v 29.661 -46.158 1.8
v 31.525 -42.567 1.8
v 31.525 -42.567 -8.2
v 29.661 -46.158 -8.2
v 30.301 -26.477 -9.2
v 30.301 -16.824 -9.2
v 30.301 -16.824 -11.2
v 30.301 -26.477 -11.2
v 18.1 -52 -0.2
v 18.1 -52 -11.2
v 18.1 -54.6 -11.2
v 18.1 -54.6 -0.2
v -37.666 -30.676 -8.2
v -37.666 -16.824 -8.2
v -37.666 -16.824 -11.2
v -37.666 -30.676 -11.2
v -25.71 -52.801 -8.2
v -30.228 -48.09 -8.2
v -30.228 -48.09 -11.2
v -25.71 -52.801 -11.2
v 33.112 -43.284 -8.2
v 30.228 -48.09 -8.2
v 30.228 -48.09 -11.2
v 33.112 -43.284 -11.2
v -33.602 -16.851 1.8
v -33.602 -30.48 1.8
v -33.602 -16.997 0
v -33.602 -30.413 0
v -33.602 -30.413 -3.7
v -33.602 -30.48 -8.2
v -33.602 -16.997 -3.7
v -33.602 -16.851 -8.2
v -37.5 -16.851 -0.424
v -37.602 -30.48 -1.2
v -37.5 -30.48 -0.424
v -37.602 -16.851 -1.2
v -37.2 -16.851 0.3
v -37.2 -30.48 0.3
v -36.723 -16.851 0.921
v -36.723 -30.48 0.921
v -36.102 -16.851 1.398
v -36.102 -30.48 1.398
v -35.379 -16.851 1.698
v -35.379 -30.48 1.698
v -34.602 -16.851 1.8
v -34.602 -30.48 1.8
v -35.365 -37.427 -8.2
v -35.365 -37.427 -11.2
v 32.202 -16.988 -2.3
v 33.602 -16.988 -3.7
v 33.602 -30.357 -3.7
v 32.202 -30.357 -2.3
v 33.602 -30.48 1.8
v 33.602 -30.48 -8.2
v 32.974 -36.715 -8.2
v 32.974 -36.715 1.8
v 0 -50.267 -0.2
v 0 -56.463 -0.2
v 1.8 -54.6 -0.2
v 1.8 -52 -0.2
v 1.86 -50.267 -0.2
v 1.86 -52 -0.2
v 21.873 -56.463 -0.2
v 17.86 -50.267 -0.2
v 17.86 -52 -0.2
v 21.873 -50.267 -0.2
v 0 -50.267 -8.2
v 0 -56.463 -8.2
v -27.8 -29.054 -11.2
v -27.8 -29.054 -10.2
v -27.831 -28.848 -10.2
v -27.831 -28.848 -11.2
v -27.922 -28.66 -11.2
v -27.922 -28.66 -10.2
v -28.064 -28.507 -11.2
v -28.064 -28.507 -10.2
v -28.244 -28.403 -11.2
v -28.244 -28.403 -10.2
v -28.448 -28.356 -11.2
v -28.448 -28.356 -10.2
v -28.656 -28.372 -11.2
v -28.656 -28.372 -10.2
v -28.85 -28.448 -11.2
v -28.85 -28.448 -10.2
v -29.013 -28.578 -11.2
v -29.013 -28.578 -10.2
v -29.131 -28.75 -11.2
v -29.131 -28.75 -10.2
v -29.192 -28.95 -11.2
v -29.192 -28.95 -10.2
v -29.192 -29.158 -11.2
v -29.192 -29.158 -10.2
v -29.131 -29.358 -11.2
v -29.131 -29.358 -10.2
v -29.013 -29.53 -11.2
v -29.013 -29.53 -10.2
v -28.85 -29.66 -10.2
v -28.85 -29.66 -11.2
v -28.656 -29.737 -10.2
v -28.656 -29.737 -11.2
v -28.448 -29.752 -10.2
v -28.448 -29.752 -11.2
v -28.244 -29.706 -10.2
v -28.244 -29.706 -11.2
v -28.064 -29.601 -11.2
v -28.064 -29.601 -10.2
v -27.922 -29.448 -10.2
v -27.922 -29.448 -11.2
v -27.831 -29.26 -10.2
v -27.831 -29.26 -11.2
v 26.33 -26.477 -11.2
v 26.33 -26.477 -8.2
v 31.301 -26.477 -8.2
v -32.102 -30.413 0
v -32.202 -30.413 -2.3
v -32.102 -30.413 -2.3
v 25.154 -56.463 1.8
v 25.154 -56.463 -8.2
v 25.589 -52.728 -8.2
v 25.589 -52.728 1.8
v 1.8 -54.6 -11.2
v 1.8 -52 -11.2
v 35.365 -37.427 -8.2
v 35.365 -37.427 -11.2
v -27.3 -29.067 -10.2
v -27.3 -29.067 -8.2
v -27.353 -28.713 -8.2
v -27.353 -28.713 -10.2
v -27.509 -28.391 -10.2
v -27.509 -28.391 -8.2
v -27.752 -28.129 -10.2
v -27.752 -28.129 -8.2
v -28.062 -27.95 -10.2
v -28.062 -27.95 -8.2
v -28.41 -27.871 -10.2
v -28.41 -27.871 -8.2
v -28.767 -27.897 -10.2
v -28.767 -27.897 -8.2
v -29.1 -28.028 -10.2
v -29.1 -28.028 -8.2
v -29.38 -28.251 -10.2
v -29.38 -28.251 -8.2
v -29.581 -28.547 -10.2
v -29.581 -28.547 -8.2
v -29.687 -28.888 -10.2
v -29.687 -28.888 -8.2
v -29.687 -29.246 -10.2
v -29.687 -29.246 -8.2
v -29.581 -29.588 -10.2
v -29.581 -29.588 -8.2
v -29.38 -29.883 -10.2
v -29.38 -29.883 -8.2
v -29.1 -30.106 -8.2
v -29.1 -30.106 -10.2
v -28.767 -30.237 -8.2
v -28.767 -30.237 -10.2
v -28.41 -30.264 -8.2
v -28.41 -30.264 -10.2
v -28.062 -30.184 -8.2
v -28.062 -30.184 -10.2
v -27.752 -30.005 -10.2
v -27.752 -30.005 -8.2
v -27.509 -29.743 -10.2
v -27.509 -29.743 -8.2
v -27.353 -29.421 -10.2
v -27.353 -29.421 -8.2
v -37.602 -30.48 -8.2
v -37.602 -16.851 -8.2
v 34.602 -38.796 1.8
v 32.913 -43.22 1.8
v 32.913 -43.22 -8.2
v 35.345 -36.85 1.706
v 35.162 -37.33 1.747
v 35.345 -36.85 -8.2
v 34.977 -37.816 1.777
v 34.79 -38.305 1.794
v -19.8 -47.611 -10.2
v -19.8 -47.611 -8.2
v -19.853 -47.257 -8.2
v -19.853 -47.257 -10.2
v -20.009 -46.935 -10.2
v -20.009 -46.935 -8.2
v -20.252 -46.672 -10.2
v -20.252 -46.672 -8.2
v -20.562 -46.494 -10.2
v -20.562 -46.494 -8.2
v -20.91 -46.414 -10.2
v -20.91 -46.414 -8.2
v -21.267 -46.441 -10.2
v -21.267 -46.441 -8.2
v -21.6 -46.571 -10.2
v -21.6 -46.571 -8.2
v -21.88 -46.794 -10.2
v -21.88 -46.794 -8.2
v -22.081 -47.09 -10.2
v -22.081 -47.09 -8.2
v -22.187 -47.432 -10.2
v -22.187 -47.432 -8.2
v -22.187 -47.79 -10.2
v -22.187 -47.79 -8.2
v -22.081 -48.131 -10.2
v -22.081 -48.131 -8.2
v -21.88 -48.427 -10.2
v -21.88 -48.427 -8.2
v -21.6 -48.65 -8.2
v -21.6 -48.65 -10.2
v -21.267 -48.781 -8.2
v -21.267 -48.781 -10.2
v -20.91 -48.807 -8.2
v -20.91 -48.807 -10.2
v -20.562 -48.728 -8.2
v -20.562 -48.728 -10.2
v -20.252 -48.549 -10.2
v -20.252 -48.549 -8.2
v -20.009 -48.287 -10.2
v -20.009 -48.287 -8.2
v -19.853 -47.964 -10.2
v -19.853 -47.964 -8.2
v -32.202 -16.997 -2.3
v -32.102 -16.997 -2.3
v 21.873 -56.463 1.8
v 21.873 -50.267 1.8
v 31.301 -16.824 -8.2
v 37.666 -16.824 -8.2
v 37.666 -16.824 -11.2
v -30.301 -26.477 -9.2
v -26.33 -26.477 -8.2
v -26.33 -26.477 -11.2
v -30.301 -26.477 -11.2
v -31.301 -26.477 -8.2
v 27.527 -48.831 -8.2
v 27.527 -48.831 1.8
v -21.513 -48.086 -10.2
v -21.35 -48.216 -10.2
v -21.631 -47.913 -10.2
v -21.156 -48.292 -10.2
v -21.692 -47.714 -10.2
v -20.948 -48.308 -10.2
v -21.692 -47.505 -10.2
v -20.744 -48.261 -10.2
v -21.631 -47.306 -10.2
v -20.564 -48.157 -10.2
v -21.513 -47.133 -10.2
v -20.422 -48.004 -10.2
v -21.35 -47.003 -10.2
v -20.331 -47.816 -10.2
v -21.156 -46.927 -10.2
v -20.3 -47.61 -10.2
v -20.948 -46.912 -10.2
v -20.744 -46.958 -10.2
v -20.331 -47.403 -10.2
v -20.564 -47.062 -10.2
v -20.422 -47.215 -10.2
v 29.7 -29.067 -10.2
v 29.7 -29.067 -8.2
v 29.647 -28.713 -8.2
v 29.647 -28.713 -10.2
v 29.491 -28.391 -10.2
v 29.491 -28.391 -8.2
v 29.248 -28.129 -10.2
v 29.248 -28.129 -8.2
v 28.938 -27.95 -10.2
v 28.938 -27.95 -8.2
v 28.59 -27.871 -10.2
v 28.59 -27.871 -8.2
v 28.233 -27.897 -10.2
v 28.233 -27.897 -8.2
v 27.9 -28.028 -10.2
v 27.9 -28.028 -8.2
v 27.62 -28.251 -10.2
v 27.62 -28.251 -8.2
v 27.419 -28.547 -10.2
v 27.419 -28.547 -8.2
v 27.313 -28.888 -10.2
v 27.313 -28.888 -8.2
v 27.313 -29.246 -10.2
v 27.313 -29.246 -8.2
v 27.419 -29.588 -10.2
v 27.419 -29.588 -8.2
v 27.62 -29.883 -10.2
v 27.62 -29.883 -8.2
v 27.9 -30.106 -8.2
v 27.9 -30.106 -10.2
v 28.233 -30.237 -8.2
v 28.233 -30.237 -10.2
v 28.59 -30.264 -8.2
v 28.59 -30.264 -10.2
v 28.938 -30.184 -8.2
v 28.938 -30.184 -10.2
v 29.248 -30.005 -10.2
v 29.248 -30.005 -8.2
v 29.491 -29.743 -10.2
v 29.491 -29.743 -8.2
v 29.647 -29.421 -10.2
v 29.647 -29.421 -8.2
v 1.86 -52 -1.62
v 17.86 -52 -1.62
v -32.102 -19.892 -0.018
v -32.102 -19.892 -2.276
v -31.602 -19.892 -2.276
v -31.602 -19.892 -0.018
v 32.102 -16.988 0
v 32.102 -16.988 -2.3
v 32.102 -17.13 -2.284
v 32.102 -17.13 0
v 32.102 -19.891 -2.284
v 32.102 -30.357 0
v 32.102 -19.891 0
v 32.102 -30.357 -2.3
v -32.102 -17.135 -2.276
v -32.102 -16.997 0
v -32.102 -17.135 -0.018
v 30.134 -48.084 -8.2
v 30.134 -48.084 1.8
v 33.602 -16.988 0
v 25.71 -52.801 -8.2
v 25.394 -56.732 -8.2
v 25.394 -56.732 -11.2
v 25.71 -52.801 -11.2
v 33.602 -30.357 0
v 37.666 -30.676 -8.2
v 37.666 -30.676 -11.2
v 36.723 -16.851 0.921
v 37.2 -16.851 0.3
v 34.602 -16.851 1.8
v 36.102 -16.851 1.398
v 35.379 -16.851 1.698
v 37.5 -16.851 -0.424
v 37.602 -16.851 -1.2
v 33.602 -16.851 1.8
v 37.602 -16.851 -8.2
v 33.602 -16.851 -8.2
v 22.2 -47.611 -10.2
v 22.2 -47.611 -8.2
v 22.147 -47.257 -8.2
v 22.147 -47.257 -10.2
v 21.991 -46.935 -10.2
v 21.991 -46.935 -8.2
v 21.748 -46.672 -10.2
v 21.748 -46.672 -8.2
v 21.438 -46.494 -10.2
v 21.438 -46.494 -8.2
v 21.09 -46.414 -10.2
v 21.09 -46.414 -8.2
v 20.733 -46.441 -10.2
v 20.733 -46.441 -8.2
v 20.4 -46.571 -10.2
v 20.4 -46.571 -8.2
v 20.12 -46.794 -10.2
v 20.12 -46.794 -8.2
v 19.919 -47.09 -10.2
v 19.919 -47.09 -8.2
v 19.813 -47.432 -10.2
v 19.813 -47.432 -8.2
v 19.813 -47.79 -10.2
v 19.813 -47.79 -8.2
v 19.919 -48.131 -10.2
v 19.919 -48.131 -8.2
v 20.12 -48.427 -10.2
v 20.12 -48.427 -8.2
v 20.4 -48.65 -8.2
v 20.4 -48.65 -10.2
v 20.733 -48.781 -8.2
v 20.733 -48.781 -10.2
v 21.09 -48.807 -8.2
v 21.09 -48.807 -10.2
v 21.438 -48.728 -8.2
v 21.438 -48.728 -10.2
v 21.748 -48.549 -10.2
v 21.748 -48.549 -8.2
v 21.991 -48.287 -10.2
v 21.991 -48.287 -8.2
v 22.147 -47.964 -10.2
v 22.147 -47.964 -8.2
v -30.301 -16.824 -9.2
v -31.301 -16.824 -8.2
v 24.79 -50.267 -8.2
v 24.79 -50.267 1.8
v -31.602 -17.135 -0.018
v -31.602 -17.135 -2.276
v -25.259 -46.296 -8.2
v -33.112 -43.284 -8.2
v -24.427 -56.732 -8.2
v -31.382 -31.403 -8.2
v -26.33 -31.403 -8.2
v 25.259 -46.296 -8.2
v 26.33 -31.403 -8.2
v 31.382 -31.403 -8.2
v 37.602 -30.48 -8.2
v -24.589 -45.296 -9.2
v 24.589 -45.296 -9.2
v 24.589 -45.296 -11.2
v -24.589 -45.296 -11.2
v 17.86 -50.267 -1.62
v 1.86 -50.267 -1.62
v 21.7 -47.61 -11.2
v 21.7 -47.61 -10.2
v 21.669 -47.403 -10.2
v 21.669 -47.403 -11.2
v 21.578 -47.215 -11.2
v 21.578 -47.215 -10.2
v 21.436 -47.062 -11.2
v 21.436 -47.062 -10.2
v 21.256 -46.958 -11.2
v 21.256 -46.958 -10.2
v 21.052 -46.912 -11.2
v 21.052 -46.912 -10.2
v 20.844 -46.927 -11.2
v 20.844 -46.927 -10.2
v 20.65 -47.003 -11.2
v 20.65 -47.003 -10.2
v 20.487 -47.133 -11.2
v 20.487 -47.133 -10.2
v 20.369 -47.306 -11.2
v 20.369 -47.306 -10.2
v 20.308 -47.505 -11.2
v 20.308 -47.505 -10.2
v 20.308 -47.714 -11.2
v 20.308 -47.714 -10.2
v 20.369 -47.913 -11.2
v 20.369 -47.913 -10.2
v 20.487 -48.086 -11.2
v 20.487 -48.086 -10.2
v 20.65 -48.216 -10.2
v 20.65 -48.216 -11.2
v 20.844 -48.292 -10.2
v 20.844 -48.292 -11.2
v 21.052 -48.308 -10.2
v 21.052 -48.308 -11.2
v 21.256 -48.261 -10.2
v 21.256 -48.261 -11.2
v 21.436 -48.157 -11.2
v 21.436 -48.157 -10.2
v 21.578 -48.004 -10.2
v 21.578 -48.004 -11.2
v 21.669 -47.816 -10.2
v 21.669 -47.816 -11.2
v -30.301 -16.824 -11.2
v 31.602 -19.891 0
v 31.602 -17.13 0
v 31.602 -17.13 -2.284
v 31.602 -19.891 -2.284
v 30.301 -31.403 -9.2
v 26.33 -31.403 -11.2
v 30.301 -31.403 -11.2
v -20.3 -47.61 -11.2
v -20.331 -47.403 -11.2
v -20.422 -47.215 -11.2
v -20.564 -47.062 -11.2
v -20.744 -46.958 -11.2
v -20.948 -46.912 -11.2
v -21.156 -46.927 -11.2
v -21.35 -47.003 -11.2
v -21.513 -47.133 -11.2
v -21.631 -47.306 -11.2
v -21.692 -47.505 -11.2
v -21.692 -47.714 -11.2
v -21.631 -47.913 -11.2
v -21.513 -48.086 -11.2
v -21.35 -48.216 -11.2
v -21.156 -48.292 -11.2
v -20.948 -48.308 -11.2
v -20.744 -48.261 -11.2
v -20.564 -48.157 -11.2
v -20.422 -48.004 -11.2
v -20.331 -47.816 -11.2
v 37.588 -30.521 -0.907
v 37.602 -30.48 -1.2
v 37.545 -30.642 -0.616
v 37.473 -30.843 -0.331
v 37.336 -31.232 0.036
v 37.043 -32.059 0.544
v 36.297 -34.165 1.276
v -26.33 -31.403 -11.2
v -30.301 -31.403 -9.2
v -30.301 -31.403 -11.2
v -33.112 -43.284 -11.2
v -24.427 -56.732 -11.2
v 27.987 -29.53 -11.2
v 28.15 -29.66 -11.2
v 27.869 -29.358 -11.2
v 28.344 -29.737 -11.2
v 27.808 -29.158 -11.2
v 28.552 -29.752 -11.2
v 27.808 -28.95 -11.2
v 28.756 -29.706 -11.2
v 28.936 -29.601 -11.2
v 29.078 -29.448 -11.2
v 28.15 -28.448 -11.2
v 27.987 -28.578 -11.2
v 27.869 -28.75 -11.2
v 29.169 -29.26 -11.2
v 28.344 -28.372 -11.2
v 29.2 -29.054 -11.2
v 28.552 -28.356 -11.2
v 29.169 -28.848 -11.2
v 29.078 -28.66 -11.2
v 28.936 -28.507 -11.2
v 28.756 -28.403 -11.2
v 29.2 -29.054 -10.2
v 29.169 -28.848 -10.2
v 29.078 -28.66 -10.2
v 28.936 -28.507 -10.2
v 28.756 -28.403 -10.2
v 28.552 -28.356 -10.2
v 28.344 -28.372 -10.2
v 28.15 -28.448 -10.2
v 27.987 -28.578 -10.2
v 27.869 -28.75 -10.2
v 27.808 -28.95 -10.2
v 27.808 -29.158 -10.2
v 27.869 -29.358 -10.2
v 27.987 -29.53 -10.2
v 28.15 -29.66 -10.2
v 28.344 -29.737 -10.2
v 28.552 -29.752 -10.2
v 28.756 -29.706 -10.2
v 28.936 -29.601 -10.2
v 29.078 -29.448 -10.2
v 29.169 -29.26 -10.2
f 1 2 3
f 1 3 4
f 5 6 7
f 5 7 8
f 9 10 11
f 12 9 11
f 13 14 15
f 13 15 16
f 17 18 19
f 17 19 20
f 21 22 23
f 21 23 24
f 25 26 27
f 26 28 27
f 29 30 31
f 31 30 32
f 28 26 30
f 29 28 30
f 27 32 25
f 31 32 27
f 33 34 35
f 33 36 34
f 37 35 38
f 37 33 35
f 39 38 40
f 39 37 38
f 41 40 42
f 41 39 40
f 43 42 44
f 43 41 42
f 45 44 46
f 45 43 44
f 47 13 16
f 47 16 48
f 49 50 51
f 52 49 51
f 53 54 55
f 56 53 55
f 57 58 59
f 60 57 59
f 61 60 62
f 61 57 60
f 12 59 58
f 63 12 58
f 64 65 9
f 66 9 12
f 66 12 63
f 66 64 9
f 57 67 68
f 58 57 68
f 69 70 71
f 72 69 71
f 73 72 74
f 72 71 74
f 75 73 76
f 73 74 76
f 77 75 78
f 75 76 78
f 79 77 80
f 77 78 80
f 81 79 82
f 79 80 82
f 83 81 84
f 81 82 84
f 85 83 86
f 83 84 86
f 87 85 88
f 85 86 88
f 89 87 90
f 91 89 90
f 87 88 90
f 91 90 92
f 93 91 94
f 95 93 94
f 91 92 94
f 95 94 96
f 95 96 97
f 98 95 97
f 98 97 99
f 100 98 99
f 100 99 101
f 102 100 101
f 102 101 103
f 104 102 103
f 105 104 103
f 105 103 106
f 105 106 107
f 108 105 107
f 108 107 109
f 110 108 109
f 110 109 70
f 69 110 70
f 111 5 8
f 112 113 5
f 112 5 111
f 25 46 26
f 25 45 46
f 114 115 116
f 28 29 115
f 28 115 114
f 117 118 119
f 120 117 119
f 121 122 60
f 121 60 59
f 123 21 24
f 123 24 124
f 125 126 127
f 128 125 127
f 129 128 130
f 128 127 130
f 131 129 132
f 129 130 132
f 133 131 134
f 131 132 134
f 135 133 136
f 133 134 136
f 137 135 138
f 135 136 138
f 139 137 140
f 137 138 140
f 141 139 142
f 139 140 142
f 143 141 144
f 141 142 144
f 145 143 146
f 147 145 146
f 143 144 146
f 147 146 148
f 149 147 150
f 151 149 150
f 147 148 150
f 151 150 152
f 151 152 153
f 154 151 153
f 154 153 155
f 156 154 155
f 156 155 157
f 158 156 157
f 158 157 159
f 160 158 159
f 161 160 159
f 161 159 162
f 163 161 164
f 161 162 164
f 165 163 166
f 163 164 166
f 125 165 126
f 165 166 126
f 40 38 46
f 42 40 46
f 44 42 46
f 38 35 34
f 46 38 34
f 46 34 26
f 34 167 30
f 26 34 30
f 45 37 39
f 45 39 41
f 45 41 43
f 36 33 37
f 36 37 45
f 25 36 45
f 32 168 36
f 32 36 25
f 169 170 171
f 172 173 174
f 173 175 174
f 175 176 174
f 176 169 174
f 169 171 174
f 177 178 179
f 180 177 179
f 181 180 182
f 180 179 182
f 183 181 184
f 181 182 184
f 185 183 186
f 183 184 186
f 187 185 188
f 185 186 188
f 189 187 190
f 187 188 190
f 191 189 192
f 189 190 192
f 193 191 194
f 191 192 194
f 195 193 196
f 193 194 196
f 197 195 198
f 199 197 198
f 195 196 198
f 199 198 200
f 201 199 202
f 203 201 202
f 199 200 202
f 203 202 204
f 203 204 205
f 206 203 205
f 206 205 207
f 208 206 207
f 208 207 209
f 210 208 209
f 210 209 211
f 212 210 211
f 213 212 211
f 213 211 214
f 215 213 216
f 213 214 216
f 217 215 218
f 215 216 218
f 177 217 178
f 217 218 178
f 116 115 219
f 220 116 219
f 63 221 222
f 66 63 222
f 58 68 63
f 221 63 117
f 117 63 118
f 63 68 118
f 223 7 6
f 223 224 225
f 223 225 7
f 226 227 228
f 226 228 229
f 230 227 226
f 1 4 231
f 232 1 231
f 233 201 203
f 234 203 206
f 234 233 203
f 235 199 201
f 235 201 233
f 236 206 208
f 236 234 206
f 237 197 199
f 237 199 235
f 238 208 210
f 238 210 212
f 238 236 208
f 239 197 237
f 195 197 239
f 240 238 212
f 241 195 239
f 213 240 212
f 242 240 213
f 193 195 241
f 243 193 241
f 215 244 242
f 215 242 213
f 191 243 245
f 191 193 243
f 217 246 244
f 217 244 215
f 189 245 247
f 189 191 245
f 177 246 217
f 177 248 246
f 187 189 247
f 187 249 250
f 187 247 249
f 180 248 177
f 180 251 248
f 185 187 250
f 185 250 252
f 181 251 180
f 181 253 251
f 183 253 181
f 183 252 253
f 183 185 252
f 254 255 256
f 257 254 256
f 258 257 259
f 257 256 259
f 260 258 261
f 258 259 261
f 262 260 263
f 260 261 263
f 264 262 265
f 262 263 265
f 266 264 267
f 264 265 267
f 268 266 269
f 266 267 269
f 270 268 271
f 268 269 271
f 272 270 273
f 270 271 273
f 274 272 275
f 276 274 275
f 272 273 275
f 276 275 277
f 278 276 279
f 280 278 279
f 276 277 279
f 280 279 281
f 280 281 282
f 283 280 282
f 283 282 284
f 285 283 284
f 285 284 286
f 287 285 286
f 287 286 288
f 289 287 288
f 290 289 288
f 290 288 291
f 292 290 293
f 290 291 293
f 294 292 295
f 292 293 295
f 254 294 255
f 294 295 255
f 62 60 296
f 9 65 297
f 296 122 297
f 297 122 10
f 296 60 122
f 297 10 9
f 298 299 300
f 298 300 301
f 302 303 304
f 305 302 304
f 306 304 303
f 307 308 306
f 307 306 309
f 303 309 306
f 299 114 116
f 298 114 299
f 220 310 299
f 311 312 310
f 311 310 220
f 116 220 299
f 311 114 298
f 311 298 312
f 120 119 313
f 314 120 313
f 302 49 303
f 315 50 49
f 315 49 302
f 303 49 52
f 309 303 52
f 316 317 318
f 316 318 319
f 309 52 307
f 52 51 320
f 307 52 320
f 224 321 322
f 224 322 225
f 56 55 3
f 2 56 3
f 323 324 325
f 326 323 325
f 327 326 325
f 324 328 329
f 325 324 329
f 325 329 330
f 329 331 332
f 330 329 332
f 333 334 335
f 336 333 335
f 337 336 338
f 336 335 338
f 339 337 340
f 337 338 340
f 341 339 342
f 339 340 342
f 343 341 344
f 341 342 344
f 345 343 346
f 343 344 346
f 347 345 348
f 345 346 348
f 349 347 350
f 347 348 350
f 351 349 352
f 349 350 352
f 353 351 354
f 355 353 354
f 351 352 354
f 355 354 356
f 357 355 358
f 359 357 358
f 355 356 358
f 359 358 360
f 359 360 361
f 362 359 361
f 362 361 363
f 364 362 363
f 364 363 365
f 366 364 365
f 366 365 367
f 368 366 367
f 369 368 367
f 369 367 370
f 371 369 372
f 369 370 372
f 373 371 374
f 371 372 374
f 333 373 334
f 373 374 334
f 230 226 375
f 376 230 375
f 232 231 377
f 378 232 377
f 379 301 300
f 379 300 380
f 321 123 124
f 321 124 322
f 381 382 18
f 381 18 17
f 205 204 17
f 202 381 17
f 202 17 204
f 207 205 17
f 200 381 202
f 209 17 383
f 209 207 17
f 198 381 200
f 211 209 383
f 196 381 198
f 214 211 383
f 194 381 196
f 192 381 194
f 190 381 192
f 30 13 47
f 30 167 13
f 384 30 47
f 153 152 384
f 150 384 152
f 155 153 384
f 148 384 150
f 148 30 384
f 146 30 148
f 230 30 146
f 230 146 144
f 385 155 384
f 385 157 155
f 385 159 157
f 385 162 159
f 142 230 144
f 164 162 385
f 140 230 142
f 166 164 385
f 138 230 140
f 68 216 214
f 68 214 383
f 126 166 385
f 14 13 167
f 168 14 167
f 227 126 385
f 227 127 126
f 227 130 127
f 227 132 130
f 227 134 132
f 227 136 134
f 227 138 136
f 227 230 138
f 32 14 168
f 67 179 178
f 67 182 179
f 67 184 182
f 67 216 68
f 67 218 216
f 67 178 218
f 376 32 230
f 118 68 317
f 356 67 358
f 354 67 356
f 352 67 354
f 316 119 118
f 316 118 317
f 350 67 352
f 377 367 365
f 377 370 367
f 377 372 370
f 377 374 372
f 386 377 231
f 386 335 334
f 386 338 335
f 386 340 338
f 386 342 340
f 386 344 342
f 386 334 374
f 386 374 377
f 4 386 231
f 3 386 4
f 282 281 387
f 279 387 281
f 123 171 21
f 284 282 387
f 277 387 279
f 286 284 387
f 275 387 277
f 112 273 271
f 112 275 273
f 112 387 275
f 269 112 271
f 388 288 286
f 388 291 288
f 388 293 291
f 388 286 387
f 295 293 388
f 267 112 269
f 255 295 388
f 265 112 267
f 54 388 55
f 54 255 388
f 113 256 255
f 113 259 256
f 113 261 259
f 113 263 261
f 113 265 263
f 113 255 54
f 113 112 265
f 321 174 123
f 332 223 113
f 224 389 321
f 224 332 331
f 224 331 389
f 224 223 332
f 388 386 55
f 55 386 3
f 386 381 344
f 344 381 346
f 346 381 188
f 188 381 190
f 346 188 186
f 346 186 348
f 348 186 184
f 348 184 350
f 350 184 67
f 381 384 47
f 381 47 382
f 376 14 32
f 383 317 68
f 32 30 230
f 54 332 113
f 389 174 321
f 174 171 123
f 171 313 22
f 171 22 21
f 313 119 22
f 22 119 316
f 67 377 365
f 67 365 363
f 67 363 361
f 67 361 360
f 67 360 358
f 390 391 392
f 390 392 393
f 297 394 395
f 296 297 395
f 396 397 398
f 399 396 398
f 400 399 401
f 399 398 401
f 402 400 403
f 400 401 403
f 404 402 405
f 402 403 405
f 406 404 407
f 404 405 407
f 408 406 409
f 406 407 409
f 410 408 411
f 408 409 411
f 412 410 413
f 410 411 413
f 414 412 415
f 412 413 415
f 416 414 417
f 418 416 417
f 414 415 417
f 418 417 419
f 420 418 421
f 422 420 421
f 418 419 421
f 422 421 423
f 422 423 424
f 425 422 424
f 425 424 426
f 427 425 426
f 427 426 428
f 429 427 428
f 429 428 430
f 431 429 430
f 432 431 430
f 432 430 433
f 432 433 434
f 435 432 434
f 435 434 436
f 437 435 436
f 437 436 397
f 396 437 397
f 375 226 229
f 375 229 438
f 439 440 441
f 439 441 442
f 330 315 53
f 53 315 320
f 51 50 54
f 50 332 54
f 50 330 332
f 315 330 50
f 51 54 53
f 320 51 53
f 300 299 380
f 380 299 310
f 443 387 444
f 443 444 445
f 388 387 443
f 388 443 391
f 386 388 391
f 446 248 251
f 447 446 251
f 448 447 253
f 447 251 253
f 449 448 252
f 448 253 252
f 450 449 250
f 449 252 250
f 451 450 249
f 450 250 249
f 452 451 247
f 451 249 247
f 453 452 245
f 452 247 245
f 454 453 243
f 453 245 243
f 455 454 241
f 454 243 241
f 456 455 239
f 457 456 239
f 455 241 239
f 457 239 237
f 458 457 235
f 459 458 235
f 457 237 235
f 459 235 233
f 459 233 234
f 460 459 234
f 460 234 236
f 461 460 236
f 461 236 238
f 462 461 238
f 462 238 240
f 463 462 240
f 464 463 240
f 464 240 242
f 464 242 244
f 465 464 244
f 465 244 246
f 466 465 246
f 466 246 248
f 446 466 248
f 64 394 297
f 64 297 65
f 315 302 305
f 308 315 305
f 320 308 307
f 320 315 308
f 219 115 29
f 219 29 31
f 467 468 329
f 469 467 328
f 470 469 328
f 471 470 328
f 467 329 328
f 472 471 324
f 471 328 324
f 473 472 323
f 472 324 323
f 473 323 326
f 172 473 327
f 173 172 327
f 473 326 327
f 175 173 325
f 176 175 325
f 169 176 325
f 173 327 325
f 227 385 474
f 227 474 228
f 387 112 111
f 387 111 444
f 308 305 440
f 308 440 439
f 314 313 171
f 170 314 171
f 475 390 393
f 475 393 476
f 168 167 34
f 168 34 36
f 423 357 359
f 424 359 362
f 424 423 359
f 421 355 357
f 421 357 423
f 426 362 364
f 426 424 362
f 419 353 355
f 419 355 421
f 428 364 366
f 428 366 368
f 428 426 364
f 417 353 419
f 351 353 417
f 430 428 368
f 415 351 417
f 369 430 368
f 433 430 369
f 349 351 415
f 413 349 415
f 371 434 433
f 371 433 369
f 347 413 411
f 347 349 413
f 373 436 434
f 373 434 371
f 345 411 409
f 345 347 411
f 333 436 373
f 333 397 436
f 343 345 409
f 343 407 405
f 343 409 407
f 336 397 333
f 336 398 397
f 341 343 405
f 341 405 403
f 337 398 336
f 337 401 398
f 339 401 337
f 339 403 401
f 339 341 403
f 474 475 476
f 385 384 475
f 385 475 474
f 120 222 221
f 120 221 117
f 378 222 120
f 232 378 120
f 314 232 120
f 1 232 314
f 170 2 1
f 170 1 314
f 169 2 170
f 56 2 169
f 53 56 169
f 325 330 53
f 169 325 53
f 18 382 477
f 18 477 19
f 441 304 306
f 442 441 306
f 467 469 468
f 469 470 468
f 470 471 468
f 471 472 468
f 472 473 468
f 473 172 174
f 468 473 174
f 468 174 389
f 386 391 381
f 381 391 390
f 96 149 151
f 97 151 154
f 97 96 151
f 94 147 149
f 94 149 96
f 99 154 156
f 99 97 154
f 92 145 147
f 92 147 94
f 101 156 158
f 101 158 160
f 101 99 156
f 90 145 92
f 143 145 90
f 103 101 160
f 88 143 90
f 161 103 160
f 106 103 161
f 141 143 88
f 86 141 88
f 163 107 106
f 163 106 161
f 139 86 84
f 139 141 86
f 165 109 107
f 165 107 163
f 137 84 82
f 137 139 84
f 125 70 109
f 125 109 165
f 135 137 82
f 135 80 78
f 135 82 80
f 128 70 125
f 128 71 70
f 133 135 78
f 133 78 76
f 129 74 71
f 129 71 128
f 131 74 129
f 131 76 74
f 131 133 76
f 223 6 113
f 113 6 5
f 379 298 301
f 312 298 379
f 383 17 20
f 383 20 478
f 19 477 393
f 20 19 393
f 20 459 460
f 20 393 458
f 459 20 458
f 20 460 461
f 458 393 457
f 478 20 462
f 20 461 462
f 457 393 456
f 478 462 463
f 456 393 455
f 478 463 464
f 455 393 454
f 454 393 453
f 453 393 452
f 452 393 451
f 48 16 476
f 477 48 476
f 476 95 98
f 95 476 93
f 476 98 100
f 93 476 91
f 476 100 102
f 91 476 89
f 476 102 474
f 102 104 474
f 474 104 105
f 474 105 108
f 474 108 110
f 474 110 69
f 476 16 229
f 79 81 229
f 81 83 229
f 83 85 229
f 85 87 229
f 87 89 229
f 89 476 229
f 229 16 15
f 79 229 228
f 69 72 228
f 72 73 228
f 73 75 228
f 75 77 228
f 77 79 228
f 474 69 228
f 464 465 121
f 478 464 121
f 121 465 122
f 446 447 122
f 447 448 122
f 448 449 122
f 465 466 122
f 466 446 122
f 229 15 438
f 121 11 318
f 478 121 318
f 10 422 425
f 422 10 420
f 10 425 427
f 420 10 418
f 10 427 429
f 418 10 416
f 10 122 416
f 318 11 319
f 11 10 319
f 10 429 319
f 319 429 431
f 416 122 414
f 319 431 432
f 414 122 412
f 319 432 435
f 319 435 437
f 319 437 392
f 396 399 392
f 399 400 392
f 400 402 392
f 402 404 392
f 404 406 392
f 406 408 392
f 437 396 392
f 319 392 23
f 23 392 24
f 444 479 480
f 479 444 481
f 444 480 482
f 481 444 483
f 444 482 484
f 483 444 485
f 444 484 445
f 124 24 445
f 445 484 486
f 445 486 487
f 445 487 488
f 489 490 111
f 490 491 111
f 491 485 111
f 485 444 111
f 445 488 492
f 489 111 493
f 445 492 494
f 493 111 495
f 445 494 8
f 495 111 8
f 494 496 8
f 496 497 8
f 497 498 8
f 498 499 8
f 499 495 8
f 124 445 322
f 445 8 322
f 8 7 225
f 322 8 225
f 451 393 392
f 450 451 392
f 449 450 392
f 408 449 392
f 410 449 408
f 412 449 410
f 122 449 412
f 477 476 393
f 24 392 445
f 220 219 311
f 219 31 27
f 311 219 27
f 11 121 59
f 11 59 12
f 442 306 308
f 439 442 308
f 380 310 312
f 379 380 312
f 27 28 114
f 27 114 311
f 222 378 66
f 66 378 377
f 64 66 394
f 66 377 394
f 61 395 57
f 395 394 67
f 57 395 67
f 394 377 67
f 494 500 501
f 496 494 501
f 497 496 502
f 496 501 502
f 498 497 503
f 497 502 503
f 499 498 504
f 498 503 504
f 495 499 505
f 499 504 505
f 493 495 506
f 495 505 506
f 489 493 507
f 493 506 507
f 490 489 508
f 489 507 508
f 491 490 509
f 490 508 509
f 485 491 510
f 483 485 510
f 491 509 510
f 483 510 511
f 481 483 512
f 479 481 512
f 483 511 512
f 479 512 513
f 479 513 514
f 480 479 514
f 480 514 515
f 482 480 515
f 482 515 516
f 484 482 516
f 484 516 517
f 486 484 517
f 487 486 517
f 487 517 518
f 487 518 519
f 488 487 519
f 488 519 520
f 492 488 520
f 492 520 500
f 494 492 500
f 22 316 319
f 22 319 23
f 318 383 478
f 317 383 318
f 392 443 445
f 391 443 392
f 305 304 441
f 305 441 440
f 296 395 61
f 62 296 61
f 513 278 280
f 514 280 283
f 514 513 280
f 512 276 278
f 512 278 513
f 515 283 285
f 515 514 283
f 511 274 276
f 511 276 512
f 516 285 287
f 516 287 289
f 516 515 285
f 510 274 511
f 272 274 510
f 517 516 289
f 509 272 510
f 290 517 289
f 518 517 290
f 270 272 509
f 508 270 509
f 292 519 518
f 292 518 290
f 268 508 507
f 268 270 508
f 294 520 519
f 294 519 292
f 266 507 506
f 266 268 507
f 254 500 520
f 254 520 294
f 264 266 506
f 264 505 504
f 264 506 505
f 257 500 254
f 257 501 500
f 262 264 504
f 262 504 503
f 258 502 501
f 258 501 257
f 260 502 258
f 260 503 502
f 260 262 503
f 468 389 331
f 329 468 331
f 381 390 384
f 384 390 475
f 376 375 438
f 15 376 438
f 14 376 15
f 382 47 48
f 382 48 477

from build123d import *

# Parameters (mm, degrees)
PAD038_DEPTH    = 3
SKETCH068_W     = 4
SKETCH068_H     = 13.628868
PAD039_DEPTH    = 10
SKETCH070_W     = 16.3
SKETCH070_H     = 2.6
POCKET031_DEPTH = 11
SKETCH071_W     = 16
SKETCH071_H     = 2.72
POCKET032_DEPTH = 4
SKETCH078_W     = 22.244752
SKETCH078_H     = 7.861252
POCKET037_DEPTH = 2
SKETCH081_W     = 13.416131
SKETCH081_H     = 2.3
PAD042_DEPTH    = 1.5
SKETCH082_W     = 13.368385
SKETCH082_H     = 2.3
PAD043_DEPTH    = 1.5
SKETCH083_W     = 2.761169
SKETCH083_H     = 2.284319
PAD044_DEPTH    = 0.5
SKETCH084_W     = 2.757059
SKETCH084_H     = 2.258492
PAD045_DEPTH    = 0.5
CHAMFER014_SIZE = 1.4
FILLET012_R     = 3
SKETCH086_R     = 1.2
POCKET038_DEPTH = 2
SKETCH087_R     = 0.7
POCKET039_DEPTH = 5
CHAMFER017_SIZE = 1


with BuildPart() as part:
    # Sketch069 → Pad038 (new body)
    with BuildSketch(Plane.XY.offset(-8.2)):
        Polygon((24.588766, -45.296032), (-24.588766, -45.296032), (-30.301265, -31.40278), (-26.329521, -31.40278), (-26.329521, -26.47687), (-30.301265, -26.47687), (-30.301265, -16.823771), (-37.665775, -16.823771), (-37.665775, -30.675779), (-35.365035, -37.426579), (-33.111649, -43.283928), (-30.227776, -48.090385), (-25.709705, -52.800713), (-24.427355, -56.731705), (25.394418, -56.731705), (25.709705, -52.800713), (30.227776, -48.090385), (33.111649, -43.283928), (35.365035, -37.426579), (37.665775, -30.675779), (37.665775, -16.823771), (30.301265, -16.823771), (30.301265, -26.47687), (26.329521, -26.47687), (26.329521, -31.40278), (30.301265, -31.40278), align=None)
    extrude(amount=-PAD038_DEPTH)

    # Sketch068 → Pad039 (join)
    with BuildSketch(Plane.XY.offset(-8.2)):
        Polygon((33.602105, -16.851452), (33.602105, -30.48032), (32.974419, -36.715145), (31.524649, -42.567276), (29.661472, -46.157772), (27.526943, -48.830738), (24.790402, -50.266937), (0, -50.266937), (0, -56.462727), (25.154314, -56.462727), (25.588615, -52.727741), (30.133654, -48.083988), (32.913181, -43.219818), (35.345268, -36.850067), (37.602105, -30.48032), (37.602105, -16.851452), align=None)
        with Locations((-35.602105, -23.665886)):
            Rectangle(SKETCH068_W, SKETCH068_H)
    extrude(amount=PAD039_DEPTH)

    # Sketch070 (on Face5 of Pad039) → Pocket031 (cut)
    with BuildSketch(Plane(origin=(0, 0, -11.2), x_dir=(1, 0, 0), z_dir=(0, 0, -1))):
        with Locations((9.95, 53.3)):
            Rectangle(SKETCH070_W, SKETCH070_H)
    extrude(amount=-POCKET031_DEPTH, mode=Mode.SUBTRACT)

    # Sketch071 (on Face35 of Pocket031) → Pocket032 (cut)
    with BuildSketch(Plane(origin=(0, -50.266937, 0), x_dir=(-1, 0, 0), z_dir=(0, 1, 0))):
        with Locations((-9.86, -0.26)):
            Rectangle(SKETCH071_W, SKETCH071_H)
    extrude(amount=-POCKET032_DEPTH, mode=Mode.SUBTRACT)

    # Sketch078 (on Face53 of Pocket032) → Pocket037 (cut)
    with BuildSketch(Plane.XY.offset(1.8)):
        with Locations((10.750455, -53.658291)):
            Rectangle(SKETCH078_W, SKETCH078_H)
    extrude(amount=-POCKET037_DEPTH, mode=Mode.SUBTRACT)

    # Sketch081 (on Face45 of Pocket037) → Pad042 (join)
    with BuildSketch(Plane.YZ.offset(-33.602105)):
        with Locations((-23.705268, -1.15)):
            Rectangle(SKETCH081_W, SKETCH081_H)
    extrude(amount=PAD042_DEPTH)

    # Sketch082 (on Face29 of Pad042) → Pad043 (join)
    with BuildSketch(Plane(origin=(33.602105, 0, 0), x_dir=(0, -1, 0), z_dir=(-1, 0, 0))):
        with Locations((23.672373, -1.15)):
            Rectangle(SKETCH082_W, SKETCH082_H)
    extrude(amount=PAD043_DEPTH)

    # Sketch083 (on Face68 of Pad043) → Pad044 (join)
    with BuildSketch(Plane(origin=(32.102105, 0, 0), x_dir=(0, -1, 0), z_dir=(-1, 0, 0))):
        with Locations((18.510706, -1.142159)):
            Rectangle(SKETCH083_W, SKETCH083_H)
    extrude(amount=PAD044_DEPTH)

    # Sketch084 (on Face70 of Pad044) → Pad045 (join)
    with BuildSketch(Plane.YZ.offset(-32.102105)):
        with Locations((-18.51388, -1.146782)):
            Rectangle(SKETCH084_W, SKETCH084_H)
    extrude(amount=PAD045_DEPTH)

    # Chamfer014
    chamfer014_edges = [part.edges().sort_by_distance(p)[0] for p in [
        (33.602105, -23.672373, -2.3),
        (-33.602105, -23.705268, -2.3),
    ]]
    chamfer(chamfer014_edges, length=CHAMFER014_SIZE)

    # Fillet012
    fillet012_edges = [part.edges().sort_by_distance(p)[0] for p in [
        (37.602105, -23.665886, 1.8),
        (-37.602105, -23.665886, 1.8),
    ]]
    fillet(fillet012_edges, radius=FILLET012_R)

    # Sketch086 (on Face4 of Fillet012) → Pocket038 (cut)
    with BuildSketch(Plane.XY.offset(-8.2)):
        with Locations((-28.5, -29.067181)):
            Circle(SKETCH086_R)
        with Locations((28.5, -29.067181)):
            Circle(SKETCH086_R)
        with Locations((-21, -47.610665)):
            Circle(SKETCH086_R)
        with Locations((21, -47.610665)):
            Circle(SKETCH086_R)
    extrude(amount=-POCKET038_DEPTH, mode=Mode.SUBTRACT)

    # Sketch087 (on Face63 of Pocket038) → Pocket039 (cut)
    with BuildSketch(Plane.XY.offset(-10.2)):
        with Locations((-28.5, -29.054167)):
            Circle(SKETCH087_R)
        with Locations((28.5, -29.054167)):
            Circle(SKETCH087_R)
        with Locations((-21, -47.60955)):
            Circle(SKETCH087_R)
        with Locations((21, -47.60955)):
            Circle(SKETCH087_R)
    extrude(amount=-POCKET039_DEPTH, mode=Mode.SUBTRACT)

    # Chamfer017
    chamfer017_edges = [part.edges().sort_by_distance(p)[0] for p in [
        (30.301265, -21.65032, -8.2),
        (27.445016, -38.349406, -8.2),
        (0, -45.296032, -8.2),
        (-27.445016, -38.349406, -8.2),
        (-30.301265, -21.65032, -8.2),
    ]]
    chamfer(chamfer017_edges, length=CHAMFER017_SIZE)


solid = part.part
